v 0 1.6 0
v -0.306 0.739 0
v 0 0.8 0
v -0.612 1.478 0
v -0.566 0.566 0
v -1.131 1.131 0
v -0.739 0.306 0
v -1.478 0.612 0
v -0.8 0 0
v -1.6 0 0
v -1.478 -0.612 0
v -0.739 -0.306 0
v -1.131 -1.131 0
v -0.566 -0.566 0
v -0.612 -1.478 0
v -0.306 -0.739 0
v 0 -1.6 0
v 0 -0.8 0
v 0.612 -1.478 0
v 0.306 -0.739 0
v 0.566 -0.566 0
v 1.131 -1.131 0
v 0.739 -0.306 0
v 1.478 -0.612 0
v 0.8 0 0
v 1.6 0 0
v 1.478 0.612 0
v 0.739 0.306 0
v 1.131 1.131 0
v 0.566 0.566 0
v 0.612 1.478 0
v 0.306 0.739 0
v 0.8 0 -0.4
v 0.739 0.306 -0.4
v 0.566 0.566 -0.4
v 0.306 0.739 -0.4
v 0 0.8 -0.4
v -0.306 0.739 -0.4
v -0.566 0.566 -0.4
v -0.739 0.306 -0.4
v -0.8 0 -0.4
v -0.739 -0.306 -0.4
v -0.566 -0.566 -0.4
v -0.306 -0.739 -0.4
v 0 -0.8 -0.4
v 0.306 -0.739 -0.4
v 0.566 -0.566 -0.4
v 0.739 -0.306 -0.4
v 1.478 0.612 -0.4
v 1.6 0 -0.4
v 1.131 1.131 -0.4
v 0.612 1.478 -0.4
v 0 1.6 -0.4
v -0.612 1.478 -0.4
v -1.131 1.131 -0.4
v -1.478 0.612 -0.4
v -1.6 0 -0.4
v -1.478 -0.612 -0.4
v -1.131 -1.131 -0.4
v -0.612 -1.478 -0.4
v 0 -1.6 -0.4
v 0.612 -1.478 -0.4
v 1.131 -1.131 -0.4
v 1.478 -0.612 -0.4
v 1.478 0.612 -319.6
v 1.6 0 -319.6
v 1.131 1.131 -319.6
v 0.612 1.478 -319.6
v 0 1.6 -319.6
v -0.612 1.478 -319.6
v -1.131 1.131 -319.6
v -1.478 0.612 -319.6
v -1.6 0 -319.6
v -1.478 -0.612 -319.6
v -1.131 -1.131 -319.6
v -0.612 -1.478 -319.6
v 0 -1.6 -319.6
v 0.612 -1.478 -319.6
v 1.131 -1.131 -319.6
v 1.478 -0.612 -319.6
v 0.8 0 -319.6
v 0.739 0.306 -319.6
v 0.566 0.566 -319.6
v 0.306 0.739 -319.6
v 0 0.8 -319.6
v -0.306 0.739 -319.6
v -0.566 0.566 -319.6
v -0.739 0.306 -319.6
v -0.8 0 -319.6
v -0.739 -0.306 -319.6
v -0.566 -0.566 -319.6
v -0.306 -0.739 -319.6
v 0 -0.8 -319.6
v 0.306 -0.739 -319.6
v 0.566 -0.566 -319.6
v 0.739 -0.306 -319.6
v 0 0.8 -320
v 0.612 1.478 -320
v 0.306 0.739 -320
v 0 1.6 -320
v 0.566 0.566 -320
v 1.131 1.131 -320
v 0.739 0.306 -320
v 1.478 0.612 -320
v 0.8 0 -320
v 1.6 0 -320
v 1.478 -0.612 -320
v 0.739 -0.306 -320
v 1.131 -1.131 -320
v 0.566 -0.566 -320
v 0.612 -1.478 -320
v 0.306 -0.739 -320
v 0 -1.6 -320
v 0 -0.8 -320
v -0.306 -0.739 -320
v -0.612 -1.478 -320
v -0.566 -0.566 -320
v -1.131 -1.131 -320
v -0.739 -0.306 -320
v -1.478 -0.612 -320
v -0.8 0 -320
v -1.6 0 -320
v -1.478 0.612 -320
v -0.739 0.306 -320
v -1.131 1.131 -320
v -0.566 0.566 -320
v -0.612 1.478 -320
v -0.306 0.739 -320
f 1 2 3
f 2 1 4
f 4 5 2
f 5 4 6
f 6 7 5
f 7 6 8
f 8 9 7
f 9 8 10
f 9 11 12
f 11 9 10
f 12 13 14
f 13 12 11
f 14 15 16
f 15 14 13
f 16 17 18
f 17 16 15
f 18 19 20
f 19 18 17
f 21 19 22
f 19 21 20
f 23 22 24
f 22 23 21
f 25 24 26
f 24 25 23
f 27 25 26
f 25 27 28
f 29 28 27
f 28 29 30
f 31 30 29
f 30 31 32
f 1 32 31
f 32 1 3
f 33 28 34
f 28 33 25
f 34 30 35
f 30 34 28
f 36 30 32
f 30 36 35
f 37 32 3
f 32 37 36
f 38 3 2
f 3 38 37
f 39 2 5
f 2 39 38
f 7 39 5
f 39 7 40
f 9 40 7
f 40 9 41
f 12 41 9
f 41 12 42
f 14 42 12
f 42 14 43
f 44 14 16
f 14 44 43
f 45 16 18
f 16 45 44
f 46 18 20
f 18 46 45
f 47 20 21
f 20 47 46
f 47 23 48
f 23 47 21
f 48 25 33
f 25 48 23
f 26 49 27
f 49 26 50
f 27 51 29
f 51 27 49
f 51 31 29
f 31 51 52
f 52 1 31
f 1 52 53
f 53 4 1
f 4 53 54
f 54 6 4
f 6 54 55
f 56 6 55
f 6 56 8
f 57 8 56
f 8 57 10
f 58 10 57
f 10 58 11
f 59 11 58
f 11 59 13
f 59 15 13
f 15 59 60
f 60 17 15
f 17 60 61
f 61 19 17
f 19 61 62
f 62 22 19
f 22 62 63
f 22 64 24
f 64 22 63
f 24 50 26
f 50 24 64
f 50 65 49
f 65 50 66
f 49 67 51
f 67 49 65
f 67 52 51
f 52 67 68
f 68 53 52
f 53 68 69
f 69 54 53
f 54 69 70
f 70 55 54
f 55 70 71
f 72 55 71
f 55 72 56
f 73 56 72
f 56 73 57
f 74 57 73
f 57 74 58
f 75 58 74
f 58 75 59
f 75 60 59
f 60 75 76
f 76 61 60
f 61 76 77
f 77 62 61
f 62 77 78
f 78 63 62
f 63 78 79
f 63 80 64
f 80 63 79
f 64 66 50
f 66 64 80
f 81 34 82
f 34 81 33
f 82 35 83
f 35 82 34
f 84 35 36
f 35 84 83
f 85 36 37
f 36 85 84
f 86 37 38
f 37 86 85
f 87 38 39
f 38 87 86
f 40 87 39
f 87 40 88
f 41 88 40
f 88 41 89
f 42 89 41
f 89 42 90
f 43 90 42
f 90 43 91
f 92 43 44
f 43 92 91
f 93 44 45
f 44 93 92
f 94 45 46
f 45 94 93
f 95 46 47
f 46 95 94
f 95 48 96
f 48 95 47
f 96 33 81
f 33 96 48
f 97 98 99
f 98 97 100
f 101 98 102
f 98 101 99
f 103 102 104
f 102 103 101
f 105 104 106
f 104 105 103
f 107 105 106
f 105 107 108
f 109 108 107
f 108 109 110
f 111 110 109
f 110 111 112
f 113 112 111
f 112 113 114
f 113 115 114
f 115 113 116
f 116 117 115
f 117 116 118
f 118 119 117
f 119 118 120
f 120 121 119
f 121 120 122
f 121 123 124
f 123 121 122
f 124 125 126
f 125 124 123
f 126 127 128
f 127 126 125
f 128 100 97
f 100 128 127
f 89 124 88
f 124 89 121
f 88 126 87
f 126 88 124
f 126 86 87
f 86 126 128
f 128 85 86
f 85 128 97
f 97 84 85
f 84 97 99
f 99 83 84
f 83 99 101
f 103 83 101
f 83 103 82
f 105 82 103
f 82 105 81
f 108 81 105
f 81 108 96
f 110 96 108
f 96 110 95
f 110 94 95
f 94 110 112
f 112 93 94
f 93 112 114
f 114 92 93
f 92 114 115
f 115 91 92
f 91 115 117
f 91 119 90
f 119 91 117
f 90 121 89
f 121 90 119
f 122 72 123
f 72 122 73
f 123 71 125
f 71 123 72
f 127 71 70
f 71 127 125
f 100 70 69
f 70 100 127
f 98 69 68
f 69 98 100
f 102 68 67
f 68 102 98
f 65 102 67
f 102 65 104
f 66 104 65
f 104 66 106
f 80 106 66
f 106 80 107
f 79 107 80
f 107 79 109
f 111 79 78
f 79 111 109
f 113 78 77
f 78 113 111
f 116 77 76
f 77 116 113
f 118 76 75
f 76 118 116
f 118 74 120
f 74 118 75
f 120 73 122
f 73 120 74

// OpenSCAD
// file: ../p/4-4ring1.scad
use <../lib.scad>
function ldraw_lib__4_4ring1() = [
// 0 Ring  1 x 1.0
// 0 Name: 4-4ring1.dat
// 0 Author: James Jessiman
// 0 !LDRAW_ORG Primitive UPDATE 2009-01
// 0 !LICENSE Licensed under CC BY 4.0 : see CAreadme.txt
// 
// 0 BFC CERTIFY CCW
  [0,"BFC","CERTIFY"],
  [0,"BFC","CCW"],
// 
// 0 !HISTORY 1998-12-15 [PTadmin] Official Update 1998-10
// 0 !HISTORY 2002-04-08 [BrickCaster] Modified for BFC compliance
// 0 !HISTORY 2002-04-25 [PTadmin] Official Update 2002-02
// 0 !HISTORY 2007-06-24 [PTadmin] Header formatted for Contributor Agreement
// 0 !HISTORY 2008-07-01 [PTadmin] Official Update 2008-01
// 0 !HISTORY 2008-08-26 [cwdee] Switch polygon winding and rename
// 0 !HISTORY 2009-05-02 [PTadmin] Official Update 2009-01
// 
// 
// 4 16 -0.7654 0 1.8478 -0.3827 0 0.9239 0 0 1 0 0 2
  [4,16,-0.7654,0,1.8478,-0.3827,0,0.9239,0,0,1,0,0,2],
// 4 16 -1.4142 0 1.4142 -0.7071 0 0.7071 -0.3827 0 0.9239 -0.7654 0 1.8478
  [4,16,-1.4142,0,1.4142,-0.7071,0,0.7071,-0.3827,0,0.9239,-0.7654,0,1.8478],
// 4 16 -1.8478 0 0.7654 -0.9239 0 0.3827 -0.7071 0 0.7071 -1.4142 0 1.41420
  [4,16,-1.8478,0,0.7654,-0.9239,0,0.3827,-0.7071,0,0.7071,-1.4142,0,1.41420],
// 4 16 -2 0 0 -1 0 0 -0.9239 0 0.3827 -1.8478 0 0.7654
  [4,16,-2,0,0,-1,0,0,-0.9239,0,0.3827,-1.8478,0,0.7654],
// 4 16 -1.8478 0 -0.7654 -0.9239 0 -0.3827 -1 0 0 -2 0 0
  [4,16,-1.8478,0,-0.7654,-0.9239,0,-0.3827,-1,0,0,-2,0,0],
// 4 16 -1.4142 0 -1.4142 -0.7071 0 -0.7071 -0.9239 0 -0.3827 -1.8478 0 -0.7654
  [4,16,-1.4142,0,-1.4142,-0.7071,0,-0.7071,-0.9239,0,-0.3827,-1.8478,0,-0.7654],
// 4 16 -0.7654 0 -1.8478 -0.3827 0 -0.9239 -0.7071 0 -0.7071 -1.4142 0 -1.4142
  [4,16,-0.7654,0,-1.8478,-0.3827,0,-0.9239,-0.7071,0,-0.7071,-1.4142,0,-1.4142],
// 4 16 0 0 -2 0 0 -1 -0.3827 0 -0.9239 -0.7654 0 -1.8478
  [4,16,0,0,-2,0,0,-1,-0.3827,0,-0.9239,-0.7654,0,-1.8478],
// 4 16 0.7654 0 -1.8478 0.3827 0 -0.9239 0 0 -1 0 0 -2
  [4,16,0.7654,0,-1.8478,0.3827,0,-0.9239,0,0,-1,0,0,-2],
// 4 16 1.4142 0 -1.4142 0.7071 0 -0.7071 0.3827 0 -0.9239 0.7654 0 -1.8478
  [4,16,1.4142,0,-1.4142,0.7071,0,-0.7071,0.3827,0,-0.9239,0.7654,0,-1.8478],
// 4 16 1.8478 0 -0.7654 0.9239 0 -0.3827 0.7071 0 -0.7071 1.4142 0 -1.4142
  [4,16,1.8478,0,-0.7654,0.9239,0,-0.3827,0.7071,0,-0.7071,1.4142,0,-1.4142],
// 4 16 2 0 0 1 0 0 0.9239 0 -0.3827 1.8478 0 -0.7654
  [4,16,2,0,0,1,0,0,0.9239,0,-0.3827,1.8478,0,-0.7654],
// 4 16 1.8478 0 0.7654 0.9239 0 0.3827 1 0 0 2 0 0
  [4,16,1.8478,0,0.7654,0.9239,0,0.3827,1,0,0,2,0,0],
// 4 16 1.4142 0 1.4142 0.7071 0 0.7071 0.9239 0 0.3827 1.8478 0 0.7654
  [4,16,1.4142,0,1.4142,0.7071,0,0.7071,0.9239,0,0.3827,1.8478,0,0.7654],
// 4 16 0.7654 0 1.8478 0.3827 0 0.9239 0.7071 0 0.7071 1.4142 0 1.4142
  [4,16,0.7654,0,1.8478,0.3827,0,0.9239,0.7071,0,0.7071,1.4142,0,1.4142],
// 4 16 0 0 2 0 0 1 0.3827 0 0.9239 0.7654 0 1.8478
  [4,16,0,0,2,0,0,1,0.3827,0,0.9239,0.7654,0,1.8478],
// 0
];
module ldraw_lib__4_4ring1(step=0, col=false, unit=2/5, alt=false, line=0.2, solid=!$preview)
    makepoly(ldraw_lib__4_4ring1(), step=step, col=col, unit=unit, alt=alt, line=line, solid=solid);
ldraw_lib__4_4ring1(line=0.2);
// file: ../p/4-4edge.scad
use <../lib.scad>
function ldraw_lib__4_4edge() = [
// 0 Circle 1.0
// 0 Name: 4-4edge.dat
// 0 Author: James Jessiman
// 0 !LDRAW_ORG Primitive UPDATE 2017-01
// 0 !LICENSE Licensed under CC BY 4.0 : see CAreadme.txt
// 
// 0 BFC CERTIFY CCW
  [0,"BFC","CERTIFY"],
  [0,"BFC","CCW"],
// 
// 0 !HISTORY 1998-12-15 [PTadmin] Official Update 1998-10
// 0 !HISTORY 2005-12-28 [PTadmin] Official Update 2005-01
// 0 !HISTORY 2007-06-24 [PTadmin] Header formatted for Contributor Agreement
// 0 !HISTORY 2008-07-01 [PTadmin] Official Update 2008-01
// 0 !HISTORY 2017-01-15 [Steffen] BFCed
// 0 !HISTORY 2017-12-30 [PTadmin] Official Update 2017-01
// 
// 
// 2 24 1 0 0 0.9239 0 0.3827
  [2,24,1,0,0,0.9239,0,0.3827],
// 2 24 0.9239 0 0.3827 0.7071 0 0.7071
  [2,24,0.9239,0,0.3827,0.7071,0,0.7071],
// 2 24 0.7071 0 0.7071 0.3827 0 0.9239
  [2,24,0.7071,0,0.7071,0.3827,0,0.9239],
// 2 24 0.3827 0 0.9239 0 0 1
  [2,24,0.3827,0,0.9239,0,0,1],
// 2 24 0 0 1 -0.3827 0 0.9239
  [2,24,0,0,1,-0.3827,0,0.9239],
// 2 24 -0.3827 0 0.9239 -0.7071 0 0.7071
  [2,24,-0.3827,0,0.9239,-0.7071,0,0.7071],
// 2 24 -0.7071 0 0.7071 -0.9239 0 0.3827
  [2,24,-0.7071,0,0.7071,-0.9239,0,0.3827],
// 2 24 -0.9239 0 0.3827 -1 0 -0
  [2,24,-0.9239,0,0.3827,-1,0,-0],
// 2 24 -1 0 -0 -0.9239 0 -0.3827
  [2,24,-1,0,-0,-0.9239,0,-0.3827],
// 2 24 -0.9239 0 -0.3827 -0.7071 0 -0.7071
  [2,24,-0.9239,0,-0.3827,-0.7071,0,-0.7071],
// 2 24 -0.7071 0 -0.7071 -0.3827 0 -0.9239
  [2,24,-0.7071,0,-0.7071,-0.3827,0,-0.9239],
// 2 24 -0.3827 0 -0.9239 0 0 -1
  [2,24,-0.3827,0,-0.9239,0,0,-1],
// 2 24 0 0 -1 0.3827 0 -0.9239
  [2,24,0,0,-1,0.3827,0,-0.9239],
// 2 24 0.3827 0 -0.9239 0.7071 0 -0.7071
  [2,24,0.3827,0,-0.9239,0.7071,0,-0.7071],
// 2 24 0.7071 0 -0.7071 0.9239 0 -0.3827
  [2,24,0.7071,0,-0.7071,0.9239,0,-0.3827],
// 2 24 0.9239 0 -0.3827 1 0 0
  [2,24,0.9239,0,-0.3827,1,0,0],
];
module ldraw_lib__4_4edge(step=0, col=false, unit=2/5, alt=false, line=0.2, solid=!$preview)
    makepoly(ldraw_lib__4_4edge(), step=step, col=col, unit=unit, alt=alt, line=line, solid=solid);
ldraw_lib__4_4edge(line=0.2);
// file: ../p/4-4cyli.scad
use <../lib.scad>
function ldraw_lib__4_4cyli() = [
// 0 Cylinder 1.0
// 0 Name: 4-4cyli.dat
// 0 Author: James Jessiman
// 0 !LDRAW_ORG Primitive UPDATE 2005-01
// 0 !LICENSE Licensed under CC BY 4.0 : see CAreadme.txt
// 
// 0 BFC CERTIFY CCW
  [0,"BFC","CERTIFY"],
  [0,"BFC","CCW"],
// 
// 0 !HISTORY 1998-12-15 [PTadmin] Official Update 1998-10
// 0 !HISTORY 2002-03-23 [sbliss] Added BFC statement; merged headers from files in distributions LDraw 0.27 and Complete.
// 0 !HISTORY 2002-04-25 [PTadmin] Official Update 2002-02
// 0 !HISTORY 2004-12-14 [guyvivan] BFC CCW
// 0 !HISTORY 2005-12-28 [PTadmin] Official Update 2005-01
// 0 !HISTORY 2007-06-24 [PTadmin] Header formatted for Contributor Agreement
// 0 !HISTORY 2008-07-01 [PTadmin] Official Update 2008-01
// 
// 
// 4 16 1 1 0 0.9239 1 0.3827 0.9239 0 0.3827 1 0 0
  [4,16,1,1,0,0.9239,1,0.3827,0.9239,0,0.3827,1,0,0],
// 5 24 1 0 0 1 1 0 0.9239 0 0.3827 0.9239 0 -0.3827
  [5,24,1,0,0,1,1,0,0.9239,0,0.3827,0.9239,0,-0.3827],
// 4 16 0.9239 1 0.3827 0.7071 1 0.7071 0.7071 0 0.7071 0.9239 0 0.3827
  [4,16,0.9239,1,0.3827,0.7071,1,0.7071,0.7071,0,0.7071,0.9239,0,0.3827],
// 5 24 0.9239 0 0.3827 0.9239 1 0.3827 0.7071 0 0.7071 1 0 0
  [5,24,0.9239,0,0.3827,0.9239,1,0.3827,0.7071,0,0.7071,1,0,0],
// 4 16 0.7071 1 0.7071 0.3827 1 0.9239 0.3827 0 0.9239 0.7071 0 0.7071
  [4,16,0.7071,1,0.7071,0.3827,1,0.9239,0.3827,0,0.9239,0.7071,0,0.7071],
// 5 24 0.7071 0 0.7071 0.7071 1 0.7071 0.3827 0 0.9239 0.9239 0 0.3827
  [5,24,0.7071,0,0.7071,0.7071,1,0.7071,0.3827,0,0.9239,0.9239,0,0.3827],
// 4 16 0.3827 1 0.9239 0 1 1 0 0 1 0.3827 0 0.9239
  [4,16,0.3827,1,0.9239,0,1,1,0,0,1,0.3827,0,0.9239],
// 5 24 0.3827 0 0.9239 0.3827 1 0.9239 0 0 1 0.7071 0 0.7071
  [5,24,0.3827,0,0.9239,0.3827,1,0.9239,0,0,1,0.7071,0,0.7071],
// 4 16 0 1 1 -0.3827 1 0.9239 -0.3827 0 0.9239 0 0 1
  [4,16,0,1,1,-0.3827,1,0.9239,-0.3827,0,0.9239,0,0,1],
// 5 24 0 0 1 0 1 1 -0.3827 0 0.9239 0.3827 0 0.9239
  [5,24,0,0,1,0,1,1,-0.3827,0,0.9239,0.3827,0,0.9239],
// 4 16 -0.3827 1 0.9239 -0.7071 1 0.7071 -0.7071 0 0.7071 -0.3827 0 0.9239
  [4,16,-0.3827,1,0.9239,-0.7071,1,0.7071,-0.7071,0,0.7071,-0.3827,0,0.9239],
// 5 24 -0.3827 0 0.9239 -0.3827 1 0.9239 -0.7071 0 0.7071 0 0 1
  [5,24,-0.3827,0,0.9239,-0.3827,1,0.9239,-0.7071,0,0.7071,0,0,1],
// 4 16 -0.7071 1 0.7071 -0.9239 1 0.3827 -0.9239 0 0.3827 -0.7071 0 0.7071
  [4,16,-0.7071,1,0.7071,-0.9239,1,0.3827,-0.9239,0,0.3827,-0.7071,0,0.7071],
// 5 24 -0.7071 0 0.7071 -0.7071 1 0.7071 -0.9239 0 0.3827 -0.3827 0 0.9239
  [5,24,-0.7071,0,0.7071,-0.7071,1,0.7071,-0.9239,0,0.3827,-0.3827,0,0.9239],
// 4 16 -0.9239 1 0.3827 -1 1 0 -1 0 0 -0.9239 0 0.3827
  [4,16,-0.9239,1,0.3827,-1,1,0,-1,0,0,-0.9239,0,0.3827],
// 5 24 -0.9239 0 0.3827 -0.9239 1 0.3827 -1 0 0 -0.7071 0 0.7071
  [5,24,-0.9239,0,0.3827,-0.9239,1,0.3827,-1,0,0,-0.7071,0,0.7071],
// 4 16 -1 1 0 -0.9239 1 -0.3827 -0.9239 0 -0.3827 -1 0 0
  [4,16,-1,1,0,-0.9239,1,-0.3827,-0.9239,0,-0.3827,-1,0,0],
// 5 24 -1 0 0 -1 1 0 -0.9239 0 -0.3827 -0.9239 0 0.3827
  [5,24,-1,0,0,-1,1,0,-0.9239,0,-0.3827,-0.9239,0,0.3827],
// 4 16 -0.9239 1 -0.3827 -0.7071 1 -0.7071 -0.7071 0 -0.7071 -0.9239 0 -0.3827
  [4,16,-0.9239,1,-0.3827,-0.7071,1,-0.7071,-0.7071,0,-0.7071,-0.9239,0,-0.3827],
// 5 24 -0.9239 0 -0.3827 -0.9239 1 -0.3827 -0.7071 0 -0.7071 -1 0 0
  [5,24,-0.9239,0,-0.3827,-0.9239,1,-0.3827,-0.7071,0,-0.7071,-1,0,0],
// 4 16 -0.7071 1 -0.7071 -0.3827 1 -0.9239 -0.3827 0 -0.9239 -0.7071 0 -0.7071
  [4,16,-0.7071,1,-0.7071,-0.3827,1,-0.9239,-0.3827,0,-0.9239,-0.7071,0,-0.7071],
// 5 24 -0.7071 0 -0.7071 -0.7071 1 -0.7071 -0.3827 0 -0.9239 -0.9239 0 -0.3827
  [5,24,-0.7071,0,-0.7071,-0.7071,1,-0.7071,-0.3827,0,-0.9239,-0.9239,0,-0.3827],
// 4 16 -0.3827 1 -0.9239 0 1 -1 0 0 -1 -0.3827 0 -0.9239
  [4,16,-0.3827,1,-0.9239,0,1,-1,0,0,-1,-0.3827,0,-0.9239],
// 5 24 -0.3827 0 -0.9239 -0.3827 1 -0.9239 0 0 -1 -0.7071 0 -0.7071
  [5,24,-0.3827,0,-0.9239,-0.3827,1,-0.9239,0,0,-1,-0.7071,0,-0.7071],
// 4 16 0 1 -1 0.3827 1 -0.9239 0.3827 0 -0.9239 0 0 -1
  [4,16,0,1,-1,0.3827,1,-0.9239,0.3827,0,-0.9239,0,0,-1],
// 5 24 0 0 -1 0 1 -1 0.3827 0 -0.9239 -0.3827 0 -0.9239
  [5,24,0,0,-1,0,1,-1,0.3827,0,-0.9239,-0.3827,0,-0.9239],
// 4 16 0.3827 1 -0.9239 0.7071 1 -0.7071 0.7071 0 -0.7071 0.3827 0 -0.9239
  [4,16,0.3827,1,-0.9239,0.7071,1,-0.7071,0.7071,0,-0.7071,0.3827,0,-0.9239],
// 5 24 0.3827 0 -0.9239 0.3827 1 -0.9239 0.7071 0 -0.7071 0 0 -1
  [5,24,0.3827,0,-0.9239,0.3827,1,-0.9239,0.7071,0,-0.7071,0,0,-1],
// 4 16 0.7071 1 -0.7071 0.9239 1 -0.3827 0.9239 0 -0.3827 0.7071 0 -0.7071
  [4,16,0.7071,1,-0.7071,0.9239,1,-0.3827,0.9239,0,-0.3827,0.7071,0,-0.7071],
// 5 24 0.7071 0 -0.7071 0.7071 1 -0.7071 0.9239 0 -0.3827 0.3827 0 -0.9239
  [5,24,0.7071,0,-0.7071,0.7071,1,-0.7071,0.9239,0,-0.3827,0.3827,0,-0.9239],
// 4 16 0.9239 1 -0.3827 1 1 0 1 0 0 0.9239 0 -0.3827
  [4,16,0.9239,1,-0.3827,1,1,0,1,0,0,0.9239,0,-0.3827],
// 5 24 0.9239 0 -0.3827 0.9239 1 -0.3827 1 0 0 0.7071 0 -0.7071
  [5,24,0.9239,0,-0.3827,0.9239,1,-0.3827,1,0,0,0.7071,0,-0.7071],
// 0
];
module ldraw_lib__4_4cyli(step=0, col=false, unit=2/5, alt=false, line=0.2, solid=!$preview)
    makepoly(ldraw_lib__4_4cyli(), step=step, col=col, unit=unit, alt=alt, line=line, solid=solid);
ldraw_lib__4_4cyli(line=0.2);
// file: u9053.scad
use <../lib.scad>
use <../p/4-4cyli.scad>
use <../p/4-4edge.scad>
use <../p/4-4ring1.scad>
function ldraw_lib__u9053() = [
// 0 ~Technic Flex-System Hose End
// 0 Name: u9053.dat
// 0 Author: William Howard [WilliamH]
// 0 !LDRAW_ORG Part UPDATE 2011-02
// 0 !LICENSE Licensed under CC BY 2.0 and CC BY 4.0 : see CAreadme.txt
// 
// 0 BFC CERTIFY CCW
  [0,"BFC","CERTIFY"],
  [0,"BFC","CCW"],
// 
// 0 !HISTORY 2011-12-21 [cwdee] Reworked subparting technique
// 0 !HISTORY 2011-12-23 [PTadmin] Renamed from 76
// 0 !HISTORY 2011-12-29 [PTadmin] Official Update 2011-02
// 
// 
// 1 16 0 0 0 2 0 0 0 1 0 0 0 2 4-4ring1.dat
  [1,16,0,0,0,2,0,0,0,1,0,0,0,2, ldraw_lib__4_4ring1()],
// 1 16 0 0 0 2 0 0 0 1 0 0 0 2 4-4edge.dat
  [1,16,0,0,0,2,0,0,0,1,0,0,0,2, ldraw_lib__4_4edge()],
// 0 BFC INVERTNEXT
  [0,"BFC","INVERTNEXT"],
// 1 16 0 0 0 2 0 0 0 1 0 0 0 2 4-4cyli.dat
  [1,16,0,0,0,2,0,0,0,1,0,0,0,2, ldraw_lib__4_4cyli()],
// 1 16 0 0 0 4 0 0 0 1 0 0 0 4 4-4edge.dat
  [1,16,0,0,0,4,0,0,0,1,0,0,0,4, ldraw_lib__4_4edge()],
// 1 16 0 0 0 4 0 0 0 1 0 0 0 4 4-4cyli.dat
  [1,16,0,0,0,4,0,0,0,1,0,0,0,4, ldraw_lib__4_4cyli()],
// 0
];
module ldraw_lib__u9053(step=0, col=false, unit=2/5, alt=false, line=0.2, solid=!$preview)
    makepoly(ldraw_lib__u9053(), step=step, col=col, unit=unit, alt=alt, line=line, solid=solid);
ldraw_lib__u9053(line=0.2);
// file: 77.scad
use <../lib.scad>
use <../p/4-4cyli.scad>
function ldraw_lib__77() = [
// 0 ~Technic Flex-System Hose Segment
// 0 Name: 77.dat
// 0 Author: William Howard [WilliamH]
// 0 !LDRAW_ORG Part UPDATE 2011-02
// 0 !LICENSE Licensed under CC BY 2.0 and CC BY 4.0 : see CAreadme.txt
// 
// 0 BFC CERTIFY CCW
  [0,"BFC","CERTIFY"],
  [0,"BFC","CCW"],
// 
// 0 !HISTORY 2011-12-21 [cwdee] Reworked subparting technique
// 0 !HISTORY 2011-12-29 [PTadmin] Official Update 2011-02
// 
// 
// 1 16 0 0 0 4 0 0 0 1 0 0 0 4 4-4cyli.dat
  [1,16,0,0,0,4,0,0,0,1,0,0,0,4, ldraw_lib__4_4cyli()],
// 0 BFC INVERTNEXT
  [0,"BFC","INVERTNEXT"],
// 1 16 0 0 0 2 0 0 0 1 0 0 0 2 4-4cyli.dat
  [1,16,0,0,0,2,0,0,0,1,0,0,0,2, ldraw_lib__4_4cyli()],
// 0
];
module ldraw_lib__77(step=0, col=false, unit=2/5, alt=false, line=0.2, solid=!$preview)
    makepoly(ldraw_lib__77(), step=step, col=col, unit=unit, alt=alt, line=line, solid=solid);
ldraw_lib__77(line=0.2);
// main file
use <../lib.scad>
use <77.scad>
use <u9053.scad>
function ldraw_lib__46305() = [
// 0 Technic Flex-System Hose 40L (800LDU)
// 0 Name: 46305.dat
// 0 Author: Tim Gould [timgould]
// 0 !LDRAW_ORG Part UPDATE 2011-02
// 0 !LICENSE Licensed under CC BY 4.0 : see CAreadme.txt
// 
// 0 BFC CERTIFY CCW
  [0,"BFC","CERTIFY"],
  [0,"BFC","CCW"],
// 
// 0 !KEYWORDS bar, BrickLink 75c40, Rebrickable 75c40, tube
// 
// 0 !HISTORY 2011-12-29 [PTadmin] Official Update 2011-02
// 
// 
// 1 16 0 0 0 1 0 0 0 1 0 0 0 1 u9053.dat
  [1,16,0,0,0,1,0,0,0,1,0,0,0,1, ldraw_lib__u9053()],
// 1 16 0 1 0 1 0 0 0 798 0 0 0 1 77.dat
  [1,16,0,1,0,1,0,0,0,798,0,0,0,1, ldraw_lib__77()],
// 1 16 0 800 0 -1 0 0 0 -1 0 0 0 1 u9053.dat
  [1,16,0,800,0,-1,0,0,0,-1,0,0,0,1, ldraw_lib__u9053()],
];
module ldraw_lib__46305(step=0, col=false, unit=2/5, alt=false, line=0.2, solid=!$preview)
    makepoly(ldraw_lib__46305(), step=step, col=col, unit=unit, alt=alt, line=line, solid=solid);
ldraw_lib__46305(line=0.2);
